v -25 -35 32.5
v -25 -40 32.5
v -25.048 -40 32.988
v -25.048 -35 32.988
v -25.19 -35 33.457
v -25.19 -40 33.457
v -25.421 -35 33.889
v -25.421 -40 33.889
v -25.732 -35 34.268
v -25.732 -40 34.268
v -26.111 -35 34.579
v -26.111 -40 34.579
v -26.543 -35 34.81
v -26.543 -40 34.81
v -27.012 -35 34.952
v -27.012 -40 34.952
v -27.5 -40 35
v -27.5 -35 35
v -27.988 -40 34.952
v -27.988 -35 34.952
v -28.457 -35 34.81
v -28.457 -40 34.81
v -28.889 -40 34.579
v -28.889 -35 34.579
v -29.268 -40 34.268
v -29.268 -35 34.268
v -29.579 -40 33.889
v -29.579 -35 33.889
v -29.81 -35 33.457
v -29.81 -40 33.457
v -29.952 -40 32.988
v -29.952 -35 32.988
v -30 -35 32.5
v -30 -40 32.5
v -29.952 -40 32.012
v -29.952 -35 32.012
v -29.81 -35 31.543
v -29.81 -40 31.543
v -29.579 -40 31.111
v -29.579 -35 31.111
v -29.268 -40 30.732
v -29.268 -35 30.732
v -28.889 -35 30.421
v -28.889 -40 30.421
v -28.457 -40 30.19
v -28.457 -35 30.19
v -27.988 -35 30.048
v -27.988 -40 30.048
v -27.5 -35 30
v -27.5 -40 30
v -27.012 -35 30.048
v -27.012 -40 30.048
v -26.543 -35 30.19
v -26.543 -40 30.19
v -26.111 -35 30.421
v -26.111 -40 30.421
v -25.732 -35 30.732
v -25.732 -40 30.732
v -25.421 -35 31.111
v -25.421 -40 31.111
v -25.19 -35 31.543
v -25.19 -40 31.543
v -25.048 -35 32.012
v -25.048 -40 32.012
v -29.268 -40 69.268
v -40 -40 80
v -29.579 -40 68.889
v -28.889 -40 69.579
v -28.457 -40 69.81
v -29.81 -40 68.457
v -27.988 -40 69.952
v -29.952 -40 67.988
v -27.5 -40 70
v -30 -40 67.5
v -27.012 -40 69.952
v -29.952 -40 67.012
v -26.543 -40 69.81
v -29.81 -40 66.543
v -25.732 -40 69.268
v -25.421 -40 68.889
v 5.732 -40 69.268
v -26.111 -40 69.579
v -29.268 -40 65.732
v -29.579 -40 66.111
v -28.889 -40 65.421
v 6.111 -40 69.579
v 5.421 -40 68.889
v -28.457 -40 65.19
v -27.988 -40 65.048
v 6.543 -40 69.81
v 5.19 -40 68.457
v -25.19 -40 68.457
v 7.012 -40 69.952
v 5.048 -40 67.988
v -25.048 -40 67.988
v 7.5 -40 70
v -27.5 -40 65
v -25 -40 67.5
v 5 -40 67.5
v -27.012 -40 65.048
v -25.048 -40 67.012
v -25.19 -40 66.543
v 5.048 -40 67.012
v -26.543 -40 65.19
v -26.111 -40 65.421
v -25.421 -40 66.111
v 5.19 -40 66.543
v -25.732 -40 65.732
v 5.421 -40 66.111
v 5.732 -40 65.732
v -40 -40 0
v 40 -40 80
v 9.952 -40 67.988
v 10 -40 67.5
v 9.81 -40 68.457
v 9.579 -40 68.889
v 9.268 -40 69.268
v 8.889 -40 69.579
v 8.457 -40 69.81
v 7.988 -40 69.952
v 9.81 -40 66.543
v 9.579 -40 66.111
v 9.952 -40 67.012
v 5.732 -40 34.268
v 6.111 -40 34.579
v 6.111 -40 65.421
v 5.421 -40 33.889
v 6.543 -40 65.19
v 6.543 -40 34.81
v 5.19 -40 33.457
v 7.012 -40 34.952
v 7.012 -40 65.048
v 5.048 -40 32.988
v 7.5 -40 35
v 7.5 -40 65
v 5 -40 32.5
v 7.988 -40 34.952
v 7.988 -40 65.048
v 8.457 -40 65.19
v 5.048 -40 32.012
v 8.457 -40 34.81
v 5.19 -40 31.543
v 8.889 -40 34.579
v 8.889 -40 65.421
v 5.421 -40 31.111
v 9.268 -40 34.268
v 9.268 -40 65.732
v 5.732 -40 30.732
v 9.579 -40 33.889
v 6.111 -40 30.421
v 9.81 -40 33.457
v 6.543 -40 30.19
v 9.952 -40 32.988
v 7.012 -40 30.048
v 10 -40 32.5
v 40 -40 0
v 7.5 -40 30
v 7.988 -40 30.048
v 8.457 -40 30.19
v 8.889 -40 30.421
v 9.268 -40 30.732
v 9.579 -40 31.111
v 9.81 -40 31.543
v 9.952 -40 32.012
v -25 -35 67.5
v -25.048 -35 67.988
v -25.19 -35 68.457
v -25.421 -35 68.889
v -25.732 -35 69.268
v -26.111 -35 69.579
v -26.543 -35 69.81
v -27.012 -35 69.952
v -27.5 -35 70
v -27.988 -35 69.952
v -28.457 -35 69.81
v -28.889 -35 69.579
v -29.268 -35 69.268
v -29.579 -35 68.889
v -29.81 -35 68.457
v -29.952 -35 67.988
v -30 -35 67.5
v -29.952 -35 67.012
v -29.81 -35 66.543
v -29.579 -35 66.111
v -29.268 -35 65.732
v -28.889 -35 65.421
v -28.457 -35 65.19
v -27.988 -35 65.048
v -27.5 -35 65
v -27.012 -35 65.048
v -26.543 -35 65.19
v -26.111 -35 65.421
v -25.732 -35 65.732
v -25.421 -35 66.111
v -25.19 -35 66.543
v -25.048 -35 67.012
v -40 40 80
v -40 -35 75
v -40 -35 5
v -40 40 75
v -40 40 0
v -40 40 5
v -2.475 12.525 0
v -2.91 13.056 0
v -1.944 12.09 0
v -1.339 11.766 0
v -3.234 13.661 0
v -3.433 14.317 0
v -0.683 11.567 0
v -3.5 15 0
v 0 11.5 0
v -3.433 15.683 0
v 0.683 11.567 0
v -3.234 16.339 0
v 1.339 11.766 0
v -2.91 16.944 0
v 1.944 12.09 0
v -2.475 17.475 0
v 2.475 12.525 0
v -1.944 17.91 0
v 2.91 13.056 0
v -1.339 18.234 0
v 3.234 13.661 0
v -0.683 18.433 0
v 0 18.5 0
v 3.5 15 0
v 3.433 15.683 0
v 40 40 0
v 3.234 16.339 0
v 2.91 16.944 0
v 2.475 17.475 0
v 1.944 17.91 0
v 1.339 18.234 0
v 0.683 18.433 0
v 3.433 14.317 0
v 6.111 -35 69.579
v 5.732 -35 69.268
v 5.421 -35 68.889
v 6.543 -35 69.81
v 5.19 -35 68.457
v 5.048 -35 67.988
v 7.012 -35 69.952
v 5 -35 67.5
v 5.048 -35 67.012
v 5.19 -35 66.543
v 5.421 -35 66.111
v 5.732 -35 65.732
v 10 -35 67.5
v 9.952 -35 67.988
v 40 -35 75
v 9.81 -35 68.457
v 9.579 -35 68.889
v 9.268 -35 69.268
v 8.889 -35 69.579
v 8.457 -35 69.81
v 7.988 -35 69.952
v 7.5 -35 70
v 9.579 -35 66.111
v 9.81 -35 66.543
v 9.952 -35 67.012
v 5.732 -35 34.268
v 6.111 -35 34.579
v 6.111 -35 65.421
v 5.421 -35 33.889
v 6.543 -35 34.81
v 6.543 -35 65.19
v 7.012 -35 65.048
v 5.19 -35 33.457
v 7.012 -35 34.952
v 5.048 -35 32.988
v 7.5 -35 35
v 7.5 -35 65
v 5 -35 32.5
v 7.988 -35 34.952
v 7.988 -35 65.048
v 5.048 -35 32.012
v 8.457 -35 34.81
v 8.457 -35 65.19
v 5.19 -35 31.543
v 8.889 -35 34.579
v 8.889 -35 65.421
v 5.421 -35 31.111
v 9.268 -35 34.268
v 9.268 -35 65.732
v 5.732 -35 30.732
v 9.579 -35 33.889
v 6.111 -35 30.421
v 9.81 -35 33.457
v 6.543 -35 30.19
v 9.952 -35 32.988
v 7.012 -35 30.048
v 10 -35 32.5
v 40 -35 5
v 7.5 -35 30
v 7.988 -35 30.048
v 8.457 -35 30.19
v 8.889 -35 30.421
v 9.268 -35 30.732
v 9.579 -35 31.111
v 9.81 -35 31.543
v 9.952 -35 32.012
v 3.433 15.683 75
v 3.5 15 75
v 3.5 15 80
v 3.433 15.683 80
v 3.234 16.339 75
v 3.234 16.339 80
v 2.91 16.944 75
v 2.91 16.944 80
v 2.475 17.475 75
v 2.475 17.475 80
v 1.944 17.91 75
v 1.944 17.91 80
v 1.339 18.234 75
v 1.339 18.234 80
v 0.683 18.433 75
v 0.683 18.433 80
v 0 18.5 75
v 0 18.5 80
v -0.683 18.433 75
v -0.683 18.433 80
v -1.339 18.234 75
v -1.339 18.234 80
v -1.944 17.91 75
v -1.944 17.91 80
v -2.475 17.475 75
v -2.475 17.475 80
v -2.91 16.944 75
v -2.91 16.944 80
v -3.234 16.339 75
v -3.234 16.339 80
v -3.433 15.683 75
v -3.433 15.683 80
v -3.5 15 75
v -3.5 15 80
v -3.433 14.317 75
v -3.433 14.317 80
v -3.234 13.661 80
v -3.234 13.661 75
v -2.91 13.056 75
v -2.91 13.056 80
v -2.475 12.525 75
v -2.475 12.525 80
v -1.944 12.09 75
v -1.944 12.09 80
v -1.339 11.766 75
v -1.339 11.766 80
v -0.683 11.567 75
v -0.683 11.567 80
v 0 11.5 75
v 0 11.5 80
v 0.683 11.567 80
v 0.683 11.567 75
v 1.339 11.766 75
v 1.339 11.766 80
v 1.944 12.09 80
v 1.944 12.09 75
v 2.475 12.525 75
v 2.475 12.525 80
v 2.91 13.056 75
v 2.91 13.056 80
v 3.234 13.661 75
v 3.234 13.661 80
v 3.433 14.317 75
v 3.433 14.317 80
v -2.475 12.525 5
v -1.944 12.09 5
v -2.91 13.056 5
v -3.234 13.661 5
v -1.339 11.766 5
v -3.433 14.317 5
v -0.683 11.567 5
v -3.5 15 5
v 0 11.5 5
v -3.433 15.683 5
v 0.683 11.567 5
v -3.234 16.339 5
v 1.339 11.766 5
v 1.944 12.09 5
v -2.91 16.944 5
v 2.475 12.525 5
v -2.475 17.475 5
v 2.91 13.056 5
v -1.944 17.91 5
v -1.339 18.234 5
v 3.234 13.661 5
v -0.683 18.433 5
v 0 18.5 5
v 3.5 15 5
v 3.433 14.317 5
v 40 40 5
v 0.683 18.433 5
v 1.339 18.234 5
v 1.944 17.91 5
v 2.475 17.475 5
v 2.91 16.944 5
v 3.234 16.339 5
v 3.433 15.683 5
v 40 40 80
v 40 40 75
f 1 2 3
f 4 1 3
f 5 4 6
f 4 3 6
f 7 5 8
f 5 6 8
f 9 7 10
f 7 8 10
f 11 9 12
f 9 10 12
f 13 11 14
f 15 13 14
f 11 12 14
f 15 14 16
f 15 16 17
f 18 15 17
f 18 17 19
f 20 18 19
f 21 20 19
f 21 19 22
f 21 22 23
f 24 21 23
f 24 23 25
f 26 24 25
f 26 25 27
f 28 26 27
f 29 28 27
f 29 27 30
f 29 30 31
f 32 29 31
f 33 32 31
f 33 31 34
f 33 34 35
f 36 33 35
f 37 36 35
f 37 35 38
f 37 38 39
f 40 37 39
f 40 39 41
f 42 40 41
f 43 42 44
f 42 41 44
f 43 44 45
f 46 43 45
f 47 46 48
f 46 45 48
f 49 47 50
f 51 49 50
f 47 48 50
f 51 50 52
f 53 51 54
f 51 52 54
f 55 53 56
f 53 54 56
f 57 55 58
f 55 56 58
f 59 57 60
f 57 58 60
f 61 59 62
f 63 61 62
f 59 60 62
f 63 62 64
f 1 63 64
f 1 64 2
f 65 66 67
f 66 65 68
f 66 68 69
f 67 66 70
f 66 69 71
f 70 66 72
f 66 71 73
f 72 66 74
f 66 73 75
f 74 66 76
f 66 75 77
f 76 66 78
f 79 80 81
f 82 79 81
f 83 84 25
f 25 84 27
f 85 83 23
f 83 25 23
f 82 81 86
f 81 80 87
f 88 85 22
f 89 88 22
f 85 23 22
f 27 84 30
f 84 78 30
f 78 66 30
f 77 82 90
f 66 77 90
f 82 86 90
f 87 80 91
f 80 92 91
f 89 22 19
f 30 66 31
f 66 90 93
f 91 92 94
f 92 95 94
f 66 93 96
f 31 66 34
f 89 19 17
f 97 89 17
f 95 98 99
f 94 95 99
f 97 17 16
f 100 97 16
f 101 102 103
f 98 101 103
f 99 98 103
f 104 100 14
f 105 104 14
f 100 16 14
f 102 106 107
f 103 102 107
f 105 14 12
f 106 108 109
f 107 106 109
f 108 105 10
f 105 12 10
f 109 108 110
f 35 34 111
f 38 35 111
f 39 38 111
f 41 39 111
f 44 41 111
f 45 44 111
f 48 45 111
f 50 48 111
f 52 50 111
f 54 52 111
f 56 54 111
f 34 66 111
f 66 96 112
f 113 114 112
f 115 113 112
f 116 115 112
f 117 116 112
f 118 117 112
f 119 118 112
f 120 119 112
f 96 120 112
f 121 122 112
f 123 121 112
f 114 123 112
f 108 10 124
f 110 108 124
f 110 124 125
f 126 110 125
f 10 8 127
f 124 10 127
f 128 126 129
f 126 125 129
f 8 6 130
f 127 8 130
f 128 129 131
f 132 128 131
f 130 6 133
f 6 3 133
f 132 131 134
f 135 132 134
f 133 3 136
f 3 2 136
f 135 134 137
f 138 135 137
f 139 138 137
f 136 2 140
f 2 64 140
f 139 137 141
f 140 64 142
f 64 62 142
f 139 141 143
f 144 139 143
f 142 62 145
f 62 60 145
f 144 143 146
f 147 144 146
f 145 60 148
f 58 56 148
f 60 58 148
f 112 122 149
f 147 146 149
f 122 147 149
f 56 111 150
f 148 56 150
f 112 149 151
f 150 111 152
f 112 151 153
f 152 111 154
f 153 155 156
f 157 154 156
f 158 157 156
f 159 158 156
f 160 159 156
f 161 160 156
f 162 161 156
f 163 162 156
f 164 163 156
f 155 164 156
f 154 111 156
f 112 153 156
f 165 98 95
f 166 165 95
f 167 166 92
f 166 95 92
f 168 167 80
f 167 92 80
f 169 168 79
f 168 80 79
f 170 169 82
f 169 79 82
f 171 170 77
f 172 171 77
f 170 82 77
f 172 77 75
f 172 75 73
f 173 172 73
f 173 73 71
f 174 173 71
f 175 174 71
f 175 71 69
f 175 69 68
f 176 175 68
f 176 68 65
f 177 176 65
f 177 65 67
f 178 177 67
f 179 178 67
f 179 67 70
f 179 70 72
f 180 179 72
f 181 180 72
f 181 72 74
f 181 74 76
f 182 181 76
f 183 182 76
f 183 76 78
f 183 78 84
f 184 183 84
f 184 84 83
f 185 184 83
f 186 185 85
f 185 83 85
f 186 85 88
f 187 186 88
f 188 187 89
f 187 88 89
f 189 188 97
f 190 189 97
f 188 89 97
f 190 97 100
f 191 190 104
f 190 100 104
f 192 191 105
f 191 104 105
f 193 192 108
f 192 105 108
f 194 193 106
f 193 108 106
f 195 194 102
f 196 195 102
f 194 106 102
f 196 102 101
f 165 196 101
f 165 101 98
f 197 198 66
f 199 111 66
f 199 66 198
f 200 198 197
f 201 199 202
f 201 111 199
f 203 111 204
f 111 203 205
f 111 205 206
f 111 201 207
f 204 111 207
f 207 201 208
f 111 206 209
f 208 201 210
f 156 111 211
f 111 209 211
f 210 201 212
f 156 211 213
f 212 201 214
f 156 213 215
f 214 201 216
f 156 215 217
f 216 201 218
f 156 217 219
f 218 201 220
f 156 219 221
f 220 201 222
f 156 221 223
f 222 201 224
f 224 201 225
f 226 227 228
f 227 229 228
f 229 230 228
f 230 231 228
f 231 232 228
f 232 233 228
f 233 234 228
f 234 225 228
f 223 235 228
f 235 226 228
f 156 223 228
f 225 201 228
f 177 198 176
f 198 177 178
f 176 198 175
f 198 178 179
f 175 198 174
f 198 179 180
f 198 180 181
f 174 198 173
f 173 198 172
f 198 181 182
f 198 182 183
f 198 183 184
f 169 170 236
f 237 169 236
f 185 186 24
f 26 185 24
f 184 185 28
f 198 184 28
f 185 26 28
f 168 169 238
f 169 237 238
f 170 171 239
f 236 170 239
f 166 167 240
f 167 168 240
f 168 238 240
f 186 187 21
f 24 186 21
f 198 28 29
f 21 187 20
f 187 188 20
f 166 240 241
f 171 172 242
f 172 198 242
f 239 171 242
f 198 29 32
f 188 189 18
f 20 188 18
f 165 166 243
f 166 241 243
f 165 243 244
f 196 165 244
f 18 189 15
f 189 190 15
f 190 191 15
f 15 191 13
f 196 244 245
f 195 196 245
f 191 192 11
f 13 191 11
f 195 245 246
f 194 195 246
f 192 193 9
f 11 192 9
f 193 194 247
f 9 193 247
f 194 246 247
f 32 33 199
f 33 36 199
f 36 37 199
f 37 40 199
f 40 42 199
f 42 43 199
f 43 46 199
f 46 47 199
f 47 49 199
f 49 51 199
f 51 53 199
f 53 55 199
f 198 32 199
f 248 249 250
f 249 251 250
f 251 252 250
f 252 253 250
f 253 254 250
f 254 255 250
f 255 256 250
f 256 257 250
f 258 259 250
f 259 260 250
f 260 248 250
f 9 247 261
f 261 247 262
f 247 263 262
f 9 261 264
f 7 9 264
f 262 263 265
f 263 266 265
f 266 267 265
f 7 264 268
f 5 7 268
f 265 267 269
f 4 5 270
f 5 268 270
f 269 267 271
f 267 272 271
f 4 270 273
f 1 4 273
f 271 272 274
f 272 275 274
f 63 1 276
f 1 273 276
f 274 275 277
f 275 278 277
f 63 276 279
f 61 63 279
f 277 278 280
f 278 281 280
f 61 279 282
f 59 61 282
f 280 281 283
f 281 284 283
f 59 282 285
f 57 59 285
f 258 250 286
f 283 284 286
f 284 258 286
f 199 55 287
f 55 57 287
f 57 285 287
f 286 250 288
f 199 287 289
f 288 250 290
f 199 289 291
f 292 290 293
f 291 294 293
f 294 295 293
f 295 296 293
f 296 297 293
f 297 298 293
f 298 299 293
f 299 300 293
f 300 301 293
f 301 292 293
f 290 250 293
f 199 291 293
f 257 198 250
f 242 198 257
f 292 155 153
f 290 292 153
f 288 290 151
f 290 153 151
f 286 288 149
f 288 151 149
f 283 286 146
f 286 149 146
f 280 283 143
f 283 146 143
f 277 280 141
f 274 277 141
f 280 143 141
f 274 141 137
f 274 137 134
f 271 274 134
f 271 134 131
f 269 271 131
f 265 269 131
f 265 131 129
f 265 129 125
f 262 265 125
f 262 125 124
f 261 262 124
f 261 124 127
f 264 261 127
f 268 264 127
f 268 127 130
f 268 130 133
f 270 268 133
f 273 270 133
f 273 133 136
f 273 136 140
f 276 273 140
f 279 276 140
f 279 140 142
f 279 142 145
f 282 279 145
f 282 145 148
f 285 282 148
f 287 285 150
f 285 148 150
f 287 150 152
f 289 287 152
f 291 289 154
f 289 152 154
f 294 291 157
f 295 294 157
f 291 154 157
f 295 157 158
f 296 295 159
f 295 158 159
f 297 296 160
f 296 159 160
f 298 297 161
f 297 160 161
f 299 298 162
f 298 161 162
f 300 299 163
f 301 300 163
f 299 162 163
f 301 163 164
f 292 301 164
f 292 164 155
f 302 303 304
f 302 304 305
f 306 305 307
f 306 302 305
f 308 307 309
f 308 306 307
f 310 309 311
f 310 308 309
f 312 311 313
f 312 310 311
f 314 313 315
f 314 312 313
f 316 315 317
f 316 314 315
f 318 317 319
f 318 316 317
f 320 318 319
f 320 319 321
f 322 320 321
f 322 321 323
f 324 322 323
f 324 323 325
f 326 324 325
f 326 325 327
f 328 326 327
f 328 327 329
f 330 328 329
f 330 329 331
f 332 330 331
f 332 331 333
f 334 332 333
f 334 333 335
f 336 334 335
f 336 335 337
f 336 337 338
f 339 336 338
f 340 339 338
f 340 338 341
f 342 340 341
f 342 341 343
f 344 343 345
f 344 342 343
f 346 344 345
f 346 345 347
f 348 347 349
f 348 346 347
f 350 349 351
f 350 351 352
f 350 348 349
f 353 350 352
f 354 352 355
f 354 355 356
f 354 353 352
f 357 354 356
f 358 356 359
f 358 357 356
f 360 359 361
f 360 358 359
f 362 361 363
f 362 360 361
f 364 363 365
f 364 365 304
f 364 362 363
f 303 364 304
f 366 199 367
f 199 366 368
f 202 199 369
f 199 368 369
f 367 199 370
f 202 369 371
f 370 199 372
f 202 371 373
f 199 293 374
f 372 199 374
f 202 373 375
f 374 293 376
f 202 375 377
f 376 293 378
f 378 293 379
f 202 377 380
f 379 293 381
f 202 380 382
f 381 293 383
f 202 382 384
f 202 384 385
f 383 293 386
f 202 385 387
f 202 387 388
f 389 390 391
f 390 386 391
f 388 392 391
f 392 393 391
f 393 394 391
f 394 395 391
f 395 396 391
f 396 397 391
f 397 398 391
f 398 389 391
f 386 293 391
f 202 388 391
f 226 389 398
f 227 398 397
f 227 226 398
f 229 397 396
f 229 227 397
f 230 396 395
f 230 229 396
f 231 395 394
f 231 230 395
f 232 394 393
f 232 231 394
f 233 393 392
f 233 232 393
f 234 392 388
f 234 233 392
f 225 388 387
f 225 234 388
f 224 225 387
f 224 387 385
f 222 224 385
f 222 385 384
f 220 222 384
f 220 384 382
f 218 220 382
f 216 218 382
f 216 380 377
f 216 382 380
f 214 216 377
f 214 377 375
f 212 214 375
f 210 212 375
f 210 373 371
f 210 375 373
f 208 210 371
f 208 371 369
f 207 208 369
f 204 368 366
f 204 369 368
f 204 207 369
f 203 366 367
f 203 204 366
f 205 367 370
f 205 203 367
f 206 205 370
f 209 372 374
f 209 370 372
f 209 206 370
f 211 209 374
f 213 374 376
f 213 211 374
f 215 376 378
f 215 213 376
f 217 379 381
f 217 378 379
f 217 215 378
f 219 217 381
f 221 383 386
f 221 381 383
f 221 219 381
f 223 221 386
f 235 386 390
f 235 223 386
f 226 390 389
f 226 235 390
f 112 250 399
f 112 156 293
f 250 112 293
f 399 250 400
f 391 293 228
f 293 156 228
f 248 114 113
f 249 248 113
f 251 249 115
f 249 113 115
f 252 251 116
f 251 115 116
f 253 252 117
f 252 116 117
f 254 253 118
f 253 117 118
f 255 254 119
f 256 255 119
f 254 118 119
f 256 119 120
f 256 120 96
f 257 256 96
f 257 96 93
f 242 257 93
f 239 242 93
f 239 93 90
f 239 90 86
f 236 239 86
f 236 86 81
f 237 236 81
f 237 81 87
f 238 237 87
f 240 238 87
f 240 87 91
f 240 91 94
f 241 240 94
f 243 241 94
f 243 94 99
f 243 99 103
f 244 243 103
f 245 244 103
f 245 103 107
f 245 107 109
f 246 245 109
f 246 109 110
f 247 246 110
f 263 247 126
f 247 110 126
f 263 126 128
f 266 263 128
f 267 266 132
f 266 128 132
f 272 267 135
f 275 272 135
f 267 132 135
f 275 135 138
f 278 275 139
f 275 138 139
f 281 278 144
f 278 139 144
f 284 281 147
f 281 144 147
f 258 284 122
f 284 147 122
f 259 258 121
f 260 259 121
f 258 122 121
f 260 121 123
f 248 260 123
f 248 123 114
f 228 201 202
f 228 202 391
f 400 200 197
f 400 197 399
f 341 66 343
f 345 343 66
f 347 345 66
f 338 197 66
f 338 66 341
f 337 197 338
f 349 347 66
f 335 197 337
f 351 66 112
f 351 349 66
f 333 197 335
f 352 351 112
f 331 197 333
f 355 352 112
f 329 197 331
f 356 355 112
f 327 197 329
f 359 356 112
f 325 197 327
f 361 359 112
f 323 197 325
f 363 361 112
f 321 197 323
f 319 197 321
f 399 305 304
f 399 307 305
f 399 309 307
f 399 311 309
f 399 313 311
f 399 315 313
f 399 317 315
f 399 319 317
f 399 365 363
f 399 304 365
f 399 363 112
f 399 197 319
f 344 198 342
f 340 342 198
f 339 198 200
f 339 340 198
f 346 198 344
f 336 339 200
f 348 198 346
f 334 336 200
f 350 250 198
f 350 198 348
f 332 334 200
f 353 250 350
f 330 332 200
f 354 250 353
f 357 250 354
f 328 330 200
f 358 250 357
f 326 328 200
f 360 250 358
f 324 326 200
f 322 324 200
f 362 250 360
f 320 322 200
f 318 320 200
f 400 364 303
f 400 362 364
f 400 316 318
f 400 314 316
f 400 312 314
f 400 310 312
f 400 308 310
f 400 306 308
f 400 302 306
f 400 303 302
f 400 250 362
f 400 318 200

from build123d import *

# Parameters (mm, degrees)
SKETCH1_W           = 80
SKETCH1_H           = 80
SKETCH1_R           = 3.5
BOSS_EXTRUDE1_DEPTH = 80
SKETCH2_W           = 70
SKETCH2_H           = 75
CUT_EXTRUDE1_DEPTH  = 80
SKETCH3_R           = 2.5
CUT_EXTRUDE2_DEPTH  = 60


with BuildPart() as part:
    # Sketch1 → Boss-Extrude1 (new body)
    with BuildSketch(Plane.XY):
        Rectangle(SKETCH1_W, SKETCH1_H)
        with Locations((0, 15)):
            Circle(SKETCH1_R, mode=Mode.SUBTRACT)
    extrude(amount=BOSS_EXTRUDE1_DEPTH)

    # Sketch2 → Cut-Extrude1 (cut)
    with BuildSketch(Plane(origin=(40, 0, 0), x_dir=(0, 0, -1), z_dir=(1, 0, 0))):
        with Locations((-40, 2.5)):
            Rectangle(SKETCH2_W, SKETCH2_H)
    extrude(amount=-CUT_EXTRUDE1_DEPTH, mode=Mode.SUBTRACT)

    # Sketch3 → Cut-Extrude2 (cut)
    with BuildSketch(Plane.XZ.offset(40)):
        with Locations((-27.5, 67.5)):
            Circle(SKETCH3_R)
        with Locations((7.5, 67.5)):
            Circle(SKETCH3_R)
        with Locations((7.5, 32.5)):
            Circle(SKETCH3_R)
        with Locations((-27.5, 32.5)):
            Circle(SKETCH3_R)
    extrude(amount=-CUT_EXTRUDE2_DEPTH, mode=Mode.SUBTRACT)


solid = part.part
